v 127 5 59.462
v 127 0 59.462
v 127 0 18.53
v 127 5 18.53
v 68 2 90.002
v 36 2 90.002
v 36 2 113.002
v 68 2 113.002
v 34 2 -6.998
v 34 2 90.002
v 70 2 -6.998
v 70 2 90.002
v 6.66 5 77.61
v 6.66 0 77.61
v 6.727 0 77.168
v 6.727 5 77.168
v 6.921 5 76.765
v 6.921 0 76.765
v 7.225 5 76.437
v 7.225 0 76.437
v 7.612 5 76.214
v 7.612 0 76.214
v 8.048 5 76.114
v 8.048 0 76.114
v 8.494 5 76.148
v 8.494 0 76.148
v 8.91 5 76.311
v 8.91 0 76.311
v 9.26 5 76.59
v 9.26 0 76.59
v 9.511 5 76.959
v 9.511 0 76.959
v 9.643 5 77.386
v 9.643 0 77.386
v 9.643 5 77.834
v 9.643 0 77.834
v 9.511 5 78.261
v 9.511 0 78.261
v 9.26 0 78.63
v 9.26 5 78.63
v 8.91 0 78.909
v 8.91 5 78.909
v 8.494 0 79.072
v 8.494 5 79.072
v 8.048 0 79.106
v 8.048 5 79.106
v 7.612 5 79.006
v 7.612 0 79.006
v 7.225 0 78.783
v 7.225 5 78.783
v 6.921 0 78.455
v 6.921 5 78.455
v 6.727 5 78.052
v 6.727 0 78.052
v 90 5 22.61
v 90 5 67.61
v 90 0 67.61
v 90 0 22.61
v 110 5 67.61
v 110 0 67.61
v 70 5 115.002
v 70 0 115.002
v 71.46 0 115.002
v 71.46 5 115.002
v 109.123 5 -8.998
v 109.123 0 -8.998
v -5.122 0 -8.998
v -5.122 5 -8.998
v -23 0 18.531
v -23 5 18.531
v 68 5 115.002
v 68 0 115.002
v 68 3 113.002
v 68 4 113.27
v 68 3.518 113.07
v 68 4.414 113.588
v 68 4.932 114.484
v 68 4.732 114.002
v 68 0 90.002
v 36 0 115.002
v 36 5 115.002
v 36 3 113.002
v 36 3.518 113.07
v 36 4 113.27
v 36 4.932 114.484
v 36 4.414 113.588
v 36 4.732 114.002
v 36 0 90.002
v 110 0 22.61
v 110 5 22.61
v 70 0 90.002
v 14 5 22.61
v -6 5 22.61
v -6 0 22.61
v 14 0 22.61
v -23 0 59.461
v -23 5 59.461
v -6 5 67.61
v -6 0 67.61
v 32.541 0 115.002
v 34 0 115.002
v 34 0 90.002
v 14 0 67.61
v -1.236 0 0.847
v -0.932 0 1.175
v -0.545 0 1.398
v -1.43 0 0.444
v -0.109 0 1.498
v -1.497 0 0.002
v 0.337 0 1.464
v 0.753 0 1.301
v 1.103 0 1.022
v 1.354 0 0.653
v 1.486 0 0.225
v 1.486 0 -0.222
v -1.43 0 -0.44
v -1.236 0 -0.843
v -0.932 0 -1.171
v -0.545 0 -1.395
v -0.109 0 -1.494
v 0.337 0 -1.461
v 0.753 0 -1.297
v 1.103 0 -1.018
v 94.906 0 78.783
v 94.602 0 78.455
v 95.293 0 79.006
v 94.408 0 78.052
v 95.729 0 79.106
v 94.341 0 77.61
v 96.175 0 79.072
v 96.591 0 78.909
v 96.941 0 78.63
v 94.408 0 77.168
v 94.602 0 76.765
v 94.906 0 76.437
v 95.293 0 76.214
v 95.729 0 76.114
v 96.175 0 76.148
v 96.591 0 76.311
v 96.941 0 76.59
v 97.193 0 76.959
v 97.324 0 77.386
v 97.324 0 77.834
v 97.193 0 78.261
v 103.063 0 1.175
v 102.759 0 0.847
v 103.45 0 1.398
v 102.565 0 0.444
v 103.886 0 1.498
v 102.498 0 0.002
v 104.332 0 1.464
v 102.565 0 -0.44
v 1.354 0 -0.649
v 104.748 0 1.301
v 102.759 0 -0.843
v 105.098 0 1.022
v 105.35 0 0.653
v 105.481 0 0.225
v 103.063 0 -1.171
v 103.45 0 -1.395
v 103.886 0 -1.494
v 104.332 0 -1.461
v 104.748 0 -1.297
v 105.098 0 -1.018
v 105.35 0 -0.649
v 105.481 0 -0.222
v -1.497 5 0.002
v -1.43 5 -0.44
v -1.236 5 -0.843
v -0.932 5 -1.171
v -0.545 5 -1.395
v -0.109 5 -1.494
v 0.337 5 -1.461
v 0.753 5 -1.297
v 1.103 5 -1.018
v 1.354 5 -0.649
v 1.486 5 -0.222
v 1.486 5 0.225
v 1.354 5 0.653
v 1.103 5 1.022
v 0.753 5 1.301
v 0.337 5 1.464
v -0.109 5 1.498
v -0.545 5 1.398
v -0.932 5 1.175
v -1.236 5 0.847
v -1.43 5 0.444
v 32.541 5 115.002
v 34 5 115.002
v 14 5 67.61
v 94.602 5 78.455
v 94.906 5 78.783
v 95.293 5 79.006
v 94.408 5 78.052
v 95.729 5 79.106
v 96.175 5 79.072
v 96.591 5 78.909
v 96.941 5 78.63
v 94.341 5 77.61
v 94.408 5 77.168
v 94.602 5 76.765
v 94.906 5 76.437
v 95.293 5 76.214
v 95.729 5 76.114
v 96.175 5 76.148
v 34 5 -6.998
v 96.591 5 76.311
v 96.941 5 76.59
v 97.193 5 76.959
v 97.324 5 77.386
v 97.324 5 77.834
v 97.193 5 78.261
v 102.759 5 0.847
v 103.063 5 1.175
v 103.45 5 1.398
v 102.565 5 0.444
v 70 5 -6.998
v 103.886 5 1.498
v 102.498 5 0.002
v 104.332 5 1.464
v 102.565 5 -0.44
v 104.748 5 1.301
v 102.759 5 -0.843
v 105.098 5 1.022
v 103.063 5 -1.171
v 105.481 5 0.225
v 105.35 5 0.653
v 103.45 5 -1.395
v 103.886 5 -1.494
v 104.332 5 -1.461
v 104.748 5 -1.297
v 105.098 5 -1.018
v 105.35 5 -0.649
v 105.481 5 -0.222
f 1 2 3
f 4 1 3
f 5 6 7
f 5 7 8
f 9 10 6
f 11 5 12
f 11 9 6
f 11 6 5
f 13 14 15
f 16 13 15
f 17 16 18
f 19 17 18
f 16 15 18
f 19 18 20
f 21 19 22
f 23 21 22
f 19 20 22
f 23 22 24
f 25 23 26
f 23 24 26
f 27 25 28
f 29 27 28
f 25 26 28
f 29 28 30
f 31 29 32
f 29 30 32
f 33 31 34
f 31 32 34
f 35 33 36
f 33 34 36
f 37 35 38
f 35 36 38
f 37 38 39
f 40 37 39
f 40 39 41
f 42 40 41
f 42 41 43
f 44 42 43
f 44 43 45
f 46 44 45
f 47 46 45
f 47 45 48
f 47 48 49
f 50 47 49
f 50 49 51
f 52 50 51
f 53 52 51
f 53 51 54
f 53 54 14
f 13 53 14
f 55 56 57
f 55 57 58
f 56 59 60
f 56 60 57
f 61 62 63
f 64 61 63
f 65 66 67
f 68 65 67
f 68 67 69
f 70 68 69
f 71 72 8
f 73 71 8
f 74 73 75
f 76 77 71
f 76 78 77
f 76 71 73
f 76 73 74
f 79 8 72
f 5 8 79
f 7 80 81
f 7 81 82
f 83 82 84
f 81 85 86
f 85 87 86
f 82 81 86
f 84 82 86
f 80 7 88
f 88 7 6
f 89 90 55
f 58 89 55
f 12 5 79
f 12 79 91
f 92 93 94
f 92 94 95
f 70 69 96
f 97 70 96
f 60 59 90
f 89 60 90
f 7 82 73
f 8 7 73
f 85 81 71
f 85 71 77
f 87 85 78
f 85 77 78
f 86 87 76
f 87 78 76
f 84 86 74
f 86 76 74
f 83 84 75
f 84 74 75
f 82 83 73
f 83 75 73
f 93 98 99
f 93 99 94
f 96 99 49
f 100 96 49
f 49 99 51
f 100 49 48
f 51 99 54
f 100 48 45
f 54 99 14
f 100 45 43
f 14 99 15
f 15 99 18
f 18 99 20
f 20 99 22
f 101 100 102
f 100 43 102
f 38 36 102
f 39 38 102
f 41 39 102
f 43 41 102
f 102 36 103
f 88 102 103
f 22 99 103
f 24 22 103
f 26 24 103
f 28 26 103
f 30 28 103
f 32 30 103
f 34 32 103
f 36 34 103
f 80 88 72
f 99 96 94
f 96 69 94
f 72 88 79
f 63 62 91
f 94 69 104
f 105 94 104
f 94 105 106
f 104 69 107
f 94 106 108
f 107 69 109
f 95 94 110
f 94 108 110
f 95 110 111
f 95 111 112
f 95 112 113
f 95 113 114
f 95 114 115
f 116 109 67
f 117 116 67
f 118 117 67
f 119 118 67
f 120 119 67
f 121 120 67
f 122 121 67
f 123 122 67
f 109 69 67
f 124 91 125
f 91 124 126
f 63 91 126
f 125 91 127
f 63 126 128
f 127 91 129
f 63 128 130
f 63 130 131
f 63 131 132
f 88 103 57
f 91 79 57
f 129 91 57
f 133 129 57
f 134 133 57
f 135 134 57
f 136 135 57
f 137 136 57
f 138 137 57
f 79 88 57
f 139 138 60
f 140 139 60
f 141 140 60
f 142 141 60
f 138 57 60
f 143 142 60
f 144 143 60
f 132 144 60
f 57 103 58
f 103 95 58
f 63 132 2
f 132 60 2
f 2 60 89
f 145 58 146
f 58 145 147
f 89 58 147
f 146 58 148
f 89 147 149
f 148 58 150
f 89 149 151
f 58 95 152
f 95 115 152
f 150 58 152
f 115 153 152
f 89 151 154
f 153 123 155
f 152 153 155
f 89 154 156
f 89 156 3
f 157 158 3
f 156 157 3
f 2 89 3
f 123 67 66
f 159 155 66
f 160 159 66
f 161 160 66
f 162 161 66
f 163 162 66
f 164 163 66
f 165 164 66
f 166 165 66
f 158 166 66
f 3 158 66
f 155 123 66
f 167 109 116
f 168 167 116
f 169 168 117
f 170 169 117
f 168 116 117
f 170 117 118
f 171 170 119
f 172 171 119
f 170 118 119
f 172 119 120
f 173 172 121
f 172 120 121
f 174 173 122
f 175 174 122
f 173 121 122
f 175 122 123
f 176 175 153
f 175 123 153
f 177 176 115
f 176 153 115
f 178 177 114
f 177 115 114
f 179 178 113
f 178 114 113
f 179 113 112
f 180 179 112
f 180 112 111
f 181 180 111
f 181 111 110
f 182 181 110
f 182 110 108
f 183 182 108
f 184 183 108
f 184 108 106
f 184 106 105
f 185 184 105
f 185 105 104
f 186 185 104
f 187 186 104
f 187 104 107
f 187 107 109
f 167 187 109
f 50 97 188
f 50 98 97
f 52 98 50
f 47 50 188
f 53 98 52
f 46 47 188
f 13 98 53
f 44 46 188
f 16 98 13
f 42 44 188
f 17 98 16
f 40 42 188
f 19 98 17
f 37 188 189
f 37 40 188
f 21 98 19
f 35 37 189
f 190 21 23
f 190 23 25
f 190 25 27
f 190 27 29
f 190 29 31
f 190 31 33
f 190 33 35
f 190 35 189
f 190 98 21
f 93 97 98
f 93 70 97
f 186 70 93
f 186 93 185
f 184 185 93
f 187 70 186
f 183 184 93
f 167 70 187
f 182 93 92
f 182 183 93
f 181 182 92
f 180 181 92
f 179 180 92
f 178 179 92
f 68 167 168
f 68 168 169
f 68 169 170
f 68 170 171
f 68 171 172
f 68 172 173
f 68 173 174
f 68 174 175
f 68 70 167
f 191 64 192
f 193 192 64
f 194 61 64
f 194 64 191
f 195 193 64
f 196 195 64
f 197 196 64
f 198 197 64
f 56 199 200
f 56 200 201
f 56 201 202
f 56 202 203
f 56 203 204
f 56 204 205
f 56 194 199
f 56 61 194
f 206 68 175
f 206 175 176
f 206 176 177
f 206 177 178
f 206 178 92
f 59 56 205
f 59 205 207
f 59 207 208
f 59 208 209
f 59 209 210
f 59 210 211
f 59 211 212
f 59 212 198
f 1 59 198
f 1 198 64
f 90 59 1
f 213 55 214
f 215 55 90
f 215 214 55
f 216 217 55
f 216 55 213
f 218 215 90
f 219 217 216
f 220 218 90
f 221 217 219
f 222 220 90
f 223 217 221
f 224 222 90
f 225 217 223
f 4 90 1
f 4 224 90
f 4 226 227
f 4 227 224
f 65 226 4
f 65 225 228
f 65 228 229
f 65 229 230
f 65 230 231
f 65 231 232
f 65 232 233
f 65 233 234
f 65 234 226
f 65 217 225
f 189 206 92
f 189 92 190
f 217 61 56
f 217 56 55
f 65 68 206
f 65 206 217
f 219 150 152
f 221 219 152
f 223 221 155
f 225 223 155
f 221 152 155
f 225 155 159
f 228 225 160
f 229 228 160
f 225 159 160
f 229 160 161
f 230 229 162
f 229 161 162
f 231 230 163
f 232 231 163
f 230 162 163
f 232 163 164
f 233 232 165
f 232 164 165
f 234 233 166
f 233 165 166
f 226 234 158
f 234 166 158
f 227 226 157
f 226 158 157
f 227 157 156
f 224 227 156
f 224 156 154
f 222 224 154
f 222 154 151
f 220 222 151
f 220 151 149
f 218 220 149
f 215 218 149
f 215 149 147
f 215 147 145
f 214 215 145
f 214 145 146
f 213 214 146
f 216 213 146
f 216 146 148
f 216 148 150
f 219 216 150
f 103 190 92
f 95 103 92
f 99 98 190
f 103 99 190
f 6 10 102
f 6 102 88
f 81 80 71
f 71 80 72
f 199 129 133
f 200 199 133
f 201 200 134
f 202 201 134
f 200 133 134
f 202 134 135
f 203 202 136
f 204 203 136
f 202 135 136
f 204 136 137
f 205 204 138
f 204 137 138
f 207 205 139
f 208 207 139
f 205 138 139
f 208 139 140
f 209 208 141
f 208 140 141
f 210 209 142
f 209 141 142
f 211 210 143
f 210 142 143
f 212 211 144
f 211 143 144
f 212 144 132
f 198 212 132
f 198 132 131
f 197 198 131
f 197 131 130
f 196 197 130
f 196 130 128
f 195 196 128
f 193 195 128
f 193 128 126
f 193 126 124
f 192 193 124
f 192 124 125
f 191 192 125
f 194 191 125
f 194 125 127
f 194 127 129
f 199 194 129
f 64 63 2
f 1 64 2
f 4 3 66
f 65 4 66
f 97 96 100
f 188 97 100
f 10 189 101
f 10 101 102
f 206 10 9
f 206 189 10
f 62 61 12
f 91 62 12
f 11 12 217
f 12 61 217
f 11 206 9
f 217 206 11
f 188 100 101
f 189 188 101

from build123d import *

# Parameters (mm, degrees)
BOSS_EXTRUDE1_DEPTH          = 5
F_3_0_3_DIAMETER_HOLE1_D     = 3
F_3_0_3_DIAMETER_HOLE1_DEPTH = 6
F_3_0_3_DIAMETER_HOLE1_TIP   = 0.901290929
SKETCH6_W                    = 36
SKETCH6_H                    = 120
CUT_EXTRUDE1_DEPTH           = 3
SKETCH9_W                    = 20
SKETCH9_H                    = 45
CUT_EXTRUDE3_DEPTH           = 172.404214254
SKETCH10_W                   = 2
SKETCH10_H                   = 25
CUT_EXTRUDE4_DEPTH           = 172.404214254
FILLET3_R                    = 2


with BuildPart() as part:
    # Sketch3 → Boss-Extrude1 (new body)
    with BuildSketch(Plane(origin=(0, 0, 0), x_dir=(1, 0, 0), z_dir=(0, 1, 0))):
        Polygon((32.540994622, -115.001759396), (71.460246245, -115.001759396), (127, -59.462005641), (127, -18.529510204), (109.123269601, 8.998240604), (-5.122028734, 8.998240604), (-23, -18.531420972), (-23, -59.460764774), align=None)
    extrude(amount=BOSS_EXTRUDE1_DEPTH)

    # Ø3.0 (3) Diameter Hole1
    with Locations(Plane(origin=(0, 5, 0), x_dir=(1, 0, 0), z_dir=(0, 1, 0))):
        with Locations((95.841240867, -77.61), (8.16, -77.61), (103.998195646, -0.001759396), (0.003045221, -0.001759396)):
            Hole(F_3_0_3_DIAMETER_HOLE1_D / 2, depth=F_3_0_3_DIAMETER_HOLE1_DEPTH)
            with Locations((0, 0, -(F_3_0_3_DIAMETER_HOLE1_DEPTH + F_3_0_3_DIAMETER_HOLE1_TIP / 2))):  # 118° drill point
                Cone(0, F_3_0_3_DIAMETER_HOLE1_D / 2, F_3_0_3_DIAMETER_HOLE1_TIP, mode=Mode.SUBTRACT)

    # Sketch6 → Cut-Extrude1 (cut)
    with BuildSketch(Plane(origin=(0, 5, 0), x_dir=(1, 0, 0), z_dir=(0, 1, 0))):
        with Locations((52, -53.001759396)):
            Rectangle(SKETCH6_W, SKETCH6_H)
    extrude(amount=-CUT_EXTRUDE1_DEPTH, mode=Mode.SUBTRACT)

    # Sketch9 → Cut-Extrude3 (cut, through all)
    with BuildSketch(Plane(origin=(0, 5, 0), x_dir=(1, 0, 0), z_dir=(0, 1, 0))):
        with Locations((4, -45.11)):
            Rectangle(SKETCH9_W, SKETCH9_H)
    cut_extrude3 = extrude(amount=-CUT_EXTRUDE3_DEPTH, mode=Mode.SUBTRACT)

    # Mirror1: Cut-Extrude3 across plane
    add(cut_extrude3.mirror(Plane(origin=(52, 0, 0), x_dir=(0, 0, 1), z_dir=(1, 0, 0))), mode=Mode.SUBTRACT)

    # Sketch10 → Cut-Extrude4 (cut, through all)
    with BuildSketch(Plane(origin=(0, 5, 0), x_dir=(1, 0, 0), z_dir=(0, 1, 0))):
        with Locations((35, -102.501759396)):
            Rectangle(SKETCH10_W, SKETCH10_H)
        with Locations((69, -102.501759396)):
            Rectangle(SKETCH10_W, SKETCH10_H)
    extrude(amount=-CUT_EXTRUDE4_DEPTH, mode=Mode.SUBTRACT)

    # Fillet3
    fillet3_edges = [part.edges().sort_by_distance(p)[0] for p in [
        (52, 5, 113.001759396),
    ]]
    fillet(fillet3_edges, radius=FILLET3_R - 0.0001)  # a hair under: the kernel refuses the full size


solid = part.part
